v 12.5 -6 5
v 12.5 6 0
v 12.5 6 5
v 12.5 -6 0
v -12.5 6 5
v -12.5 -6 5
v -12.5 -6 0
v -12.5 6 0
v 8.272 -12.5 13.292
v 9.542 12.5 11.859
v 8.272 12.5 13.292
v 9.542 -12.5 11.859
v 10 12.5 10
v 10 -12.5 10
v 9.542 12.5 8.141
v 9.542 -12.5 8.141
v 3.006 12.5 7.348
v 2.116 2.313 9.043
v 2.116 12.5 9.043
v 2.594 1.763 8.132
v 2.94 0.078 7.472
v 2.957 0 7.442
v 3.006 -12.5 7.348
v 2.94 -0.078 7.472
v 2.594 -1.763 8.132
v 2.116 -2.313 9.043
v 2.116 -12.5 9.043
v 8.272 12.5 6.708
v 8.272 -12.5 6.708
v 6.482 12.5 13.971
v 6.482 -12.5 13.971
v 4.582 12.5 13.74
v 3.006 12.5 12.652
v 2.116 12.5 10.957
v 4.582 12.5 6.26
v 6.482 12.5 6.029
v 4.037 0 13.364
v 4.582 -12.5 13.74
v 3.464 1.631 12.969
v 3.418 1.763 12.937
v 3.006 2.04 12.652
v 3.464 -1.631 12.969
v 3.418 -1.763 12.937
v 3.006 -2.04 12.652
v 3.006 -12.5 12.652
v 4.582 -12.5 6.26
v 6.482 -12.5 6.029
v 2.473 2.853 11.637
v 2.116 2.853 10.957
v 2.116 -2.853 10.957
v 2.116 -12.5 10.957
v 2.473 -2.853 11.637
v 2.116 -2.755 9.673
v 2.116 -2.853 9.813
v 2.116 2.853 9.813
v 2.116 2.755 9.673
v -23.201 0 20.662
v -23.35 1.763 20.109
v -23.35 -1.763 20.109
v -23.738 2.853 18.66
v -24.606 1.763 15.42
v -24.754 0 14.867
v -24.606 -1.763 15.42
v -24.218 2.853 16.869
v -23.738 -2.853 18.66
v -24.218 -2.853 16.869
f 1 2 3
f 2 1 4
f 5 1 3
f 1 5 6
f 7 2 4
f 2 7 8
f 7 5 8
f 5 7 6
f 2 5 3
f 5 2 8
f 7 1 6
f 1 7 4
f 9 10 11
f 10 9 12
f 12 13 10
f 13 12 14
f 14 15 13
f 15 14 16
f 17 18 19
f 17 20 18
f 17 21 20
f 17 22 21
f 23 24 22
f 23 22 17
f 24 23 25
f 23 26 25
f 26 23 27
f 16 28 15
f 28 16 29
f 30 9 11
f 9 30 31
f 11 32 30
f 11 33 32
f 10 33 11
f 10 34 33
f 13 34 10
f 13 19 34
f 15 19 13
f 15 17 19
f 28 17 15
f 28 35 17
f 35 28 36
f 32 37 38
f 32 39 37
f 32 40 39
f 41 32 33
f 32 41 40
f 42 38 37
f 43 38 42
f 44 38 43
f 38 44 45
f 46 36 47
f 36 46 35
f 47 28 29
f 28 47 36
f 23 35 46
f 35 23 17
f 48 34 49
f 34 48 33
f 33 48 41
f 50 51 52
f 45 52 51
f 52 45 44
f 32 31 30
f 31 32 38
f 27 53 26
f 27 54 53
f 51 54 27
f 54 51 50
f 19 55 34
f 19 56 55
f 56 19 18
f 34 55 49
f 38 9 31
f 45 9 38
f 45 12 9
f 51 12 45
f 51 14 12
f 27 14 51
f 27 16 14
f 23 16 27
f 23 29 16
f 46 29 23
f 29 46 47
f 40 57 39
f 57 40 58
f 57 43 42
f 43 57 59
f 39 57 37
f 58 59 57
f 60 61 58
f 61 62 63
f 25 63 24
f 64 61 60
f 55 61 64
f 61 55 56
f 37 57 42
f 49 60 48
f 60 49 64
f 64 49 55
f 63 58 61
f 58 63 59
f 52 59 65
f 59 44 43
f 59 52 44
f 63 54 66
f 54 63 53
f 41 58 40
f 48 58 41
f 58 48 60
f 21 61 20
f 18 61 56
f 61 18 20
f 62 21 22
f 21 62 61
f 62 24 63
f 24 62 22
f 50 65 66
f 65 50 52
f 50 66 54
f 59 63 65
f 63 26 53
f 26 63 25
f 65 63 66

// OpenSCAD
%translate([-25,0,5])rotate([0,90,0])cylinder(r=4,h=50);
translate([-12.5,-6,0])cube([25,12,5]);
translate([6,12.5,10])rotate([90,0,0])cylinder(r=4,h=25);
//translate([-5,-6,10])cube([15,12,5]);
#translate([5,0,10])rotate([0,-75,0])translate([0,0,0])cylinder(r=3,h=30);
